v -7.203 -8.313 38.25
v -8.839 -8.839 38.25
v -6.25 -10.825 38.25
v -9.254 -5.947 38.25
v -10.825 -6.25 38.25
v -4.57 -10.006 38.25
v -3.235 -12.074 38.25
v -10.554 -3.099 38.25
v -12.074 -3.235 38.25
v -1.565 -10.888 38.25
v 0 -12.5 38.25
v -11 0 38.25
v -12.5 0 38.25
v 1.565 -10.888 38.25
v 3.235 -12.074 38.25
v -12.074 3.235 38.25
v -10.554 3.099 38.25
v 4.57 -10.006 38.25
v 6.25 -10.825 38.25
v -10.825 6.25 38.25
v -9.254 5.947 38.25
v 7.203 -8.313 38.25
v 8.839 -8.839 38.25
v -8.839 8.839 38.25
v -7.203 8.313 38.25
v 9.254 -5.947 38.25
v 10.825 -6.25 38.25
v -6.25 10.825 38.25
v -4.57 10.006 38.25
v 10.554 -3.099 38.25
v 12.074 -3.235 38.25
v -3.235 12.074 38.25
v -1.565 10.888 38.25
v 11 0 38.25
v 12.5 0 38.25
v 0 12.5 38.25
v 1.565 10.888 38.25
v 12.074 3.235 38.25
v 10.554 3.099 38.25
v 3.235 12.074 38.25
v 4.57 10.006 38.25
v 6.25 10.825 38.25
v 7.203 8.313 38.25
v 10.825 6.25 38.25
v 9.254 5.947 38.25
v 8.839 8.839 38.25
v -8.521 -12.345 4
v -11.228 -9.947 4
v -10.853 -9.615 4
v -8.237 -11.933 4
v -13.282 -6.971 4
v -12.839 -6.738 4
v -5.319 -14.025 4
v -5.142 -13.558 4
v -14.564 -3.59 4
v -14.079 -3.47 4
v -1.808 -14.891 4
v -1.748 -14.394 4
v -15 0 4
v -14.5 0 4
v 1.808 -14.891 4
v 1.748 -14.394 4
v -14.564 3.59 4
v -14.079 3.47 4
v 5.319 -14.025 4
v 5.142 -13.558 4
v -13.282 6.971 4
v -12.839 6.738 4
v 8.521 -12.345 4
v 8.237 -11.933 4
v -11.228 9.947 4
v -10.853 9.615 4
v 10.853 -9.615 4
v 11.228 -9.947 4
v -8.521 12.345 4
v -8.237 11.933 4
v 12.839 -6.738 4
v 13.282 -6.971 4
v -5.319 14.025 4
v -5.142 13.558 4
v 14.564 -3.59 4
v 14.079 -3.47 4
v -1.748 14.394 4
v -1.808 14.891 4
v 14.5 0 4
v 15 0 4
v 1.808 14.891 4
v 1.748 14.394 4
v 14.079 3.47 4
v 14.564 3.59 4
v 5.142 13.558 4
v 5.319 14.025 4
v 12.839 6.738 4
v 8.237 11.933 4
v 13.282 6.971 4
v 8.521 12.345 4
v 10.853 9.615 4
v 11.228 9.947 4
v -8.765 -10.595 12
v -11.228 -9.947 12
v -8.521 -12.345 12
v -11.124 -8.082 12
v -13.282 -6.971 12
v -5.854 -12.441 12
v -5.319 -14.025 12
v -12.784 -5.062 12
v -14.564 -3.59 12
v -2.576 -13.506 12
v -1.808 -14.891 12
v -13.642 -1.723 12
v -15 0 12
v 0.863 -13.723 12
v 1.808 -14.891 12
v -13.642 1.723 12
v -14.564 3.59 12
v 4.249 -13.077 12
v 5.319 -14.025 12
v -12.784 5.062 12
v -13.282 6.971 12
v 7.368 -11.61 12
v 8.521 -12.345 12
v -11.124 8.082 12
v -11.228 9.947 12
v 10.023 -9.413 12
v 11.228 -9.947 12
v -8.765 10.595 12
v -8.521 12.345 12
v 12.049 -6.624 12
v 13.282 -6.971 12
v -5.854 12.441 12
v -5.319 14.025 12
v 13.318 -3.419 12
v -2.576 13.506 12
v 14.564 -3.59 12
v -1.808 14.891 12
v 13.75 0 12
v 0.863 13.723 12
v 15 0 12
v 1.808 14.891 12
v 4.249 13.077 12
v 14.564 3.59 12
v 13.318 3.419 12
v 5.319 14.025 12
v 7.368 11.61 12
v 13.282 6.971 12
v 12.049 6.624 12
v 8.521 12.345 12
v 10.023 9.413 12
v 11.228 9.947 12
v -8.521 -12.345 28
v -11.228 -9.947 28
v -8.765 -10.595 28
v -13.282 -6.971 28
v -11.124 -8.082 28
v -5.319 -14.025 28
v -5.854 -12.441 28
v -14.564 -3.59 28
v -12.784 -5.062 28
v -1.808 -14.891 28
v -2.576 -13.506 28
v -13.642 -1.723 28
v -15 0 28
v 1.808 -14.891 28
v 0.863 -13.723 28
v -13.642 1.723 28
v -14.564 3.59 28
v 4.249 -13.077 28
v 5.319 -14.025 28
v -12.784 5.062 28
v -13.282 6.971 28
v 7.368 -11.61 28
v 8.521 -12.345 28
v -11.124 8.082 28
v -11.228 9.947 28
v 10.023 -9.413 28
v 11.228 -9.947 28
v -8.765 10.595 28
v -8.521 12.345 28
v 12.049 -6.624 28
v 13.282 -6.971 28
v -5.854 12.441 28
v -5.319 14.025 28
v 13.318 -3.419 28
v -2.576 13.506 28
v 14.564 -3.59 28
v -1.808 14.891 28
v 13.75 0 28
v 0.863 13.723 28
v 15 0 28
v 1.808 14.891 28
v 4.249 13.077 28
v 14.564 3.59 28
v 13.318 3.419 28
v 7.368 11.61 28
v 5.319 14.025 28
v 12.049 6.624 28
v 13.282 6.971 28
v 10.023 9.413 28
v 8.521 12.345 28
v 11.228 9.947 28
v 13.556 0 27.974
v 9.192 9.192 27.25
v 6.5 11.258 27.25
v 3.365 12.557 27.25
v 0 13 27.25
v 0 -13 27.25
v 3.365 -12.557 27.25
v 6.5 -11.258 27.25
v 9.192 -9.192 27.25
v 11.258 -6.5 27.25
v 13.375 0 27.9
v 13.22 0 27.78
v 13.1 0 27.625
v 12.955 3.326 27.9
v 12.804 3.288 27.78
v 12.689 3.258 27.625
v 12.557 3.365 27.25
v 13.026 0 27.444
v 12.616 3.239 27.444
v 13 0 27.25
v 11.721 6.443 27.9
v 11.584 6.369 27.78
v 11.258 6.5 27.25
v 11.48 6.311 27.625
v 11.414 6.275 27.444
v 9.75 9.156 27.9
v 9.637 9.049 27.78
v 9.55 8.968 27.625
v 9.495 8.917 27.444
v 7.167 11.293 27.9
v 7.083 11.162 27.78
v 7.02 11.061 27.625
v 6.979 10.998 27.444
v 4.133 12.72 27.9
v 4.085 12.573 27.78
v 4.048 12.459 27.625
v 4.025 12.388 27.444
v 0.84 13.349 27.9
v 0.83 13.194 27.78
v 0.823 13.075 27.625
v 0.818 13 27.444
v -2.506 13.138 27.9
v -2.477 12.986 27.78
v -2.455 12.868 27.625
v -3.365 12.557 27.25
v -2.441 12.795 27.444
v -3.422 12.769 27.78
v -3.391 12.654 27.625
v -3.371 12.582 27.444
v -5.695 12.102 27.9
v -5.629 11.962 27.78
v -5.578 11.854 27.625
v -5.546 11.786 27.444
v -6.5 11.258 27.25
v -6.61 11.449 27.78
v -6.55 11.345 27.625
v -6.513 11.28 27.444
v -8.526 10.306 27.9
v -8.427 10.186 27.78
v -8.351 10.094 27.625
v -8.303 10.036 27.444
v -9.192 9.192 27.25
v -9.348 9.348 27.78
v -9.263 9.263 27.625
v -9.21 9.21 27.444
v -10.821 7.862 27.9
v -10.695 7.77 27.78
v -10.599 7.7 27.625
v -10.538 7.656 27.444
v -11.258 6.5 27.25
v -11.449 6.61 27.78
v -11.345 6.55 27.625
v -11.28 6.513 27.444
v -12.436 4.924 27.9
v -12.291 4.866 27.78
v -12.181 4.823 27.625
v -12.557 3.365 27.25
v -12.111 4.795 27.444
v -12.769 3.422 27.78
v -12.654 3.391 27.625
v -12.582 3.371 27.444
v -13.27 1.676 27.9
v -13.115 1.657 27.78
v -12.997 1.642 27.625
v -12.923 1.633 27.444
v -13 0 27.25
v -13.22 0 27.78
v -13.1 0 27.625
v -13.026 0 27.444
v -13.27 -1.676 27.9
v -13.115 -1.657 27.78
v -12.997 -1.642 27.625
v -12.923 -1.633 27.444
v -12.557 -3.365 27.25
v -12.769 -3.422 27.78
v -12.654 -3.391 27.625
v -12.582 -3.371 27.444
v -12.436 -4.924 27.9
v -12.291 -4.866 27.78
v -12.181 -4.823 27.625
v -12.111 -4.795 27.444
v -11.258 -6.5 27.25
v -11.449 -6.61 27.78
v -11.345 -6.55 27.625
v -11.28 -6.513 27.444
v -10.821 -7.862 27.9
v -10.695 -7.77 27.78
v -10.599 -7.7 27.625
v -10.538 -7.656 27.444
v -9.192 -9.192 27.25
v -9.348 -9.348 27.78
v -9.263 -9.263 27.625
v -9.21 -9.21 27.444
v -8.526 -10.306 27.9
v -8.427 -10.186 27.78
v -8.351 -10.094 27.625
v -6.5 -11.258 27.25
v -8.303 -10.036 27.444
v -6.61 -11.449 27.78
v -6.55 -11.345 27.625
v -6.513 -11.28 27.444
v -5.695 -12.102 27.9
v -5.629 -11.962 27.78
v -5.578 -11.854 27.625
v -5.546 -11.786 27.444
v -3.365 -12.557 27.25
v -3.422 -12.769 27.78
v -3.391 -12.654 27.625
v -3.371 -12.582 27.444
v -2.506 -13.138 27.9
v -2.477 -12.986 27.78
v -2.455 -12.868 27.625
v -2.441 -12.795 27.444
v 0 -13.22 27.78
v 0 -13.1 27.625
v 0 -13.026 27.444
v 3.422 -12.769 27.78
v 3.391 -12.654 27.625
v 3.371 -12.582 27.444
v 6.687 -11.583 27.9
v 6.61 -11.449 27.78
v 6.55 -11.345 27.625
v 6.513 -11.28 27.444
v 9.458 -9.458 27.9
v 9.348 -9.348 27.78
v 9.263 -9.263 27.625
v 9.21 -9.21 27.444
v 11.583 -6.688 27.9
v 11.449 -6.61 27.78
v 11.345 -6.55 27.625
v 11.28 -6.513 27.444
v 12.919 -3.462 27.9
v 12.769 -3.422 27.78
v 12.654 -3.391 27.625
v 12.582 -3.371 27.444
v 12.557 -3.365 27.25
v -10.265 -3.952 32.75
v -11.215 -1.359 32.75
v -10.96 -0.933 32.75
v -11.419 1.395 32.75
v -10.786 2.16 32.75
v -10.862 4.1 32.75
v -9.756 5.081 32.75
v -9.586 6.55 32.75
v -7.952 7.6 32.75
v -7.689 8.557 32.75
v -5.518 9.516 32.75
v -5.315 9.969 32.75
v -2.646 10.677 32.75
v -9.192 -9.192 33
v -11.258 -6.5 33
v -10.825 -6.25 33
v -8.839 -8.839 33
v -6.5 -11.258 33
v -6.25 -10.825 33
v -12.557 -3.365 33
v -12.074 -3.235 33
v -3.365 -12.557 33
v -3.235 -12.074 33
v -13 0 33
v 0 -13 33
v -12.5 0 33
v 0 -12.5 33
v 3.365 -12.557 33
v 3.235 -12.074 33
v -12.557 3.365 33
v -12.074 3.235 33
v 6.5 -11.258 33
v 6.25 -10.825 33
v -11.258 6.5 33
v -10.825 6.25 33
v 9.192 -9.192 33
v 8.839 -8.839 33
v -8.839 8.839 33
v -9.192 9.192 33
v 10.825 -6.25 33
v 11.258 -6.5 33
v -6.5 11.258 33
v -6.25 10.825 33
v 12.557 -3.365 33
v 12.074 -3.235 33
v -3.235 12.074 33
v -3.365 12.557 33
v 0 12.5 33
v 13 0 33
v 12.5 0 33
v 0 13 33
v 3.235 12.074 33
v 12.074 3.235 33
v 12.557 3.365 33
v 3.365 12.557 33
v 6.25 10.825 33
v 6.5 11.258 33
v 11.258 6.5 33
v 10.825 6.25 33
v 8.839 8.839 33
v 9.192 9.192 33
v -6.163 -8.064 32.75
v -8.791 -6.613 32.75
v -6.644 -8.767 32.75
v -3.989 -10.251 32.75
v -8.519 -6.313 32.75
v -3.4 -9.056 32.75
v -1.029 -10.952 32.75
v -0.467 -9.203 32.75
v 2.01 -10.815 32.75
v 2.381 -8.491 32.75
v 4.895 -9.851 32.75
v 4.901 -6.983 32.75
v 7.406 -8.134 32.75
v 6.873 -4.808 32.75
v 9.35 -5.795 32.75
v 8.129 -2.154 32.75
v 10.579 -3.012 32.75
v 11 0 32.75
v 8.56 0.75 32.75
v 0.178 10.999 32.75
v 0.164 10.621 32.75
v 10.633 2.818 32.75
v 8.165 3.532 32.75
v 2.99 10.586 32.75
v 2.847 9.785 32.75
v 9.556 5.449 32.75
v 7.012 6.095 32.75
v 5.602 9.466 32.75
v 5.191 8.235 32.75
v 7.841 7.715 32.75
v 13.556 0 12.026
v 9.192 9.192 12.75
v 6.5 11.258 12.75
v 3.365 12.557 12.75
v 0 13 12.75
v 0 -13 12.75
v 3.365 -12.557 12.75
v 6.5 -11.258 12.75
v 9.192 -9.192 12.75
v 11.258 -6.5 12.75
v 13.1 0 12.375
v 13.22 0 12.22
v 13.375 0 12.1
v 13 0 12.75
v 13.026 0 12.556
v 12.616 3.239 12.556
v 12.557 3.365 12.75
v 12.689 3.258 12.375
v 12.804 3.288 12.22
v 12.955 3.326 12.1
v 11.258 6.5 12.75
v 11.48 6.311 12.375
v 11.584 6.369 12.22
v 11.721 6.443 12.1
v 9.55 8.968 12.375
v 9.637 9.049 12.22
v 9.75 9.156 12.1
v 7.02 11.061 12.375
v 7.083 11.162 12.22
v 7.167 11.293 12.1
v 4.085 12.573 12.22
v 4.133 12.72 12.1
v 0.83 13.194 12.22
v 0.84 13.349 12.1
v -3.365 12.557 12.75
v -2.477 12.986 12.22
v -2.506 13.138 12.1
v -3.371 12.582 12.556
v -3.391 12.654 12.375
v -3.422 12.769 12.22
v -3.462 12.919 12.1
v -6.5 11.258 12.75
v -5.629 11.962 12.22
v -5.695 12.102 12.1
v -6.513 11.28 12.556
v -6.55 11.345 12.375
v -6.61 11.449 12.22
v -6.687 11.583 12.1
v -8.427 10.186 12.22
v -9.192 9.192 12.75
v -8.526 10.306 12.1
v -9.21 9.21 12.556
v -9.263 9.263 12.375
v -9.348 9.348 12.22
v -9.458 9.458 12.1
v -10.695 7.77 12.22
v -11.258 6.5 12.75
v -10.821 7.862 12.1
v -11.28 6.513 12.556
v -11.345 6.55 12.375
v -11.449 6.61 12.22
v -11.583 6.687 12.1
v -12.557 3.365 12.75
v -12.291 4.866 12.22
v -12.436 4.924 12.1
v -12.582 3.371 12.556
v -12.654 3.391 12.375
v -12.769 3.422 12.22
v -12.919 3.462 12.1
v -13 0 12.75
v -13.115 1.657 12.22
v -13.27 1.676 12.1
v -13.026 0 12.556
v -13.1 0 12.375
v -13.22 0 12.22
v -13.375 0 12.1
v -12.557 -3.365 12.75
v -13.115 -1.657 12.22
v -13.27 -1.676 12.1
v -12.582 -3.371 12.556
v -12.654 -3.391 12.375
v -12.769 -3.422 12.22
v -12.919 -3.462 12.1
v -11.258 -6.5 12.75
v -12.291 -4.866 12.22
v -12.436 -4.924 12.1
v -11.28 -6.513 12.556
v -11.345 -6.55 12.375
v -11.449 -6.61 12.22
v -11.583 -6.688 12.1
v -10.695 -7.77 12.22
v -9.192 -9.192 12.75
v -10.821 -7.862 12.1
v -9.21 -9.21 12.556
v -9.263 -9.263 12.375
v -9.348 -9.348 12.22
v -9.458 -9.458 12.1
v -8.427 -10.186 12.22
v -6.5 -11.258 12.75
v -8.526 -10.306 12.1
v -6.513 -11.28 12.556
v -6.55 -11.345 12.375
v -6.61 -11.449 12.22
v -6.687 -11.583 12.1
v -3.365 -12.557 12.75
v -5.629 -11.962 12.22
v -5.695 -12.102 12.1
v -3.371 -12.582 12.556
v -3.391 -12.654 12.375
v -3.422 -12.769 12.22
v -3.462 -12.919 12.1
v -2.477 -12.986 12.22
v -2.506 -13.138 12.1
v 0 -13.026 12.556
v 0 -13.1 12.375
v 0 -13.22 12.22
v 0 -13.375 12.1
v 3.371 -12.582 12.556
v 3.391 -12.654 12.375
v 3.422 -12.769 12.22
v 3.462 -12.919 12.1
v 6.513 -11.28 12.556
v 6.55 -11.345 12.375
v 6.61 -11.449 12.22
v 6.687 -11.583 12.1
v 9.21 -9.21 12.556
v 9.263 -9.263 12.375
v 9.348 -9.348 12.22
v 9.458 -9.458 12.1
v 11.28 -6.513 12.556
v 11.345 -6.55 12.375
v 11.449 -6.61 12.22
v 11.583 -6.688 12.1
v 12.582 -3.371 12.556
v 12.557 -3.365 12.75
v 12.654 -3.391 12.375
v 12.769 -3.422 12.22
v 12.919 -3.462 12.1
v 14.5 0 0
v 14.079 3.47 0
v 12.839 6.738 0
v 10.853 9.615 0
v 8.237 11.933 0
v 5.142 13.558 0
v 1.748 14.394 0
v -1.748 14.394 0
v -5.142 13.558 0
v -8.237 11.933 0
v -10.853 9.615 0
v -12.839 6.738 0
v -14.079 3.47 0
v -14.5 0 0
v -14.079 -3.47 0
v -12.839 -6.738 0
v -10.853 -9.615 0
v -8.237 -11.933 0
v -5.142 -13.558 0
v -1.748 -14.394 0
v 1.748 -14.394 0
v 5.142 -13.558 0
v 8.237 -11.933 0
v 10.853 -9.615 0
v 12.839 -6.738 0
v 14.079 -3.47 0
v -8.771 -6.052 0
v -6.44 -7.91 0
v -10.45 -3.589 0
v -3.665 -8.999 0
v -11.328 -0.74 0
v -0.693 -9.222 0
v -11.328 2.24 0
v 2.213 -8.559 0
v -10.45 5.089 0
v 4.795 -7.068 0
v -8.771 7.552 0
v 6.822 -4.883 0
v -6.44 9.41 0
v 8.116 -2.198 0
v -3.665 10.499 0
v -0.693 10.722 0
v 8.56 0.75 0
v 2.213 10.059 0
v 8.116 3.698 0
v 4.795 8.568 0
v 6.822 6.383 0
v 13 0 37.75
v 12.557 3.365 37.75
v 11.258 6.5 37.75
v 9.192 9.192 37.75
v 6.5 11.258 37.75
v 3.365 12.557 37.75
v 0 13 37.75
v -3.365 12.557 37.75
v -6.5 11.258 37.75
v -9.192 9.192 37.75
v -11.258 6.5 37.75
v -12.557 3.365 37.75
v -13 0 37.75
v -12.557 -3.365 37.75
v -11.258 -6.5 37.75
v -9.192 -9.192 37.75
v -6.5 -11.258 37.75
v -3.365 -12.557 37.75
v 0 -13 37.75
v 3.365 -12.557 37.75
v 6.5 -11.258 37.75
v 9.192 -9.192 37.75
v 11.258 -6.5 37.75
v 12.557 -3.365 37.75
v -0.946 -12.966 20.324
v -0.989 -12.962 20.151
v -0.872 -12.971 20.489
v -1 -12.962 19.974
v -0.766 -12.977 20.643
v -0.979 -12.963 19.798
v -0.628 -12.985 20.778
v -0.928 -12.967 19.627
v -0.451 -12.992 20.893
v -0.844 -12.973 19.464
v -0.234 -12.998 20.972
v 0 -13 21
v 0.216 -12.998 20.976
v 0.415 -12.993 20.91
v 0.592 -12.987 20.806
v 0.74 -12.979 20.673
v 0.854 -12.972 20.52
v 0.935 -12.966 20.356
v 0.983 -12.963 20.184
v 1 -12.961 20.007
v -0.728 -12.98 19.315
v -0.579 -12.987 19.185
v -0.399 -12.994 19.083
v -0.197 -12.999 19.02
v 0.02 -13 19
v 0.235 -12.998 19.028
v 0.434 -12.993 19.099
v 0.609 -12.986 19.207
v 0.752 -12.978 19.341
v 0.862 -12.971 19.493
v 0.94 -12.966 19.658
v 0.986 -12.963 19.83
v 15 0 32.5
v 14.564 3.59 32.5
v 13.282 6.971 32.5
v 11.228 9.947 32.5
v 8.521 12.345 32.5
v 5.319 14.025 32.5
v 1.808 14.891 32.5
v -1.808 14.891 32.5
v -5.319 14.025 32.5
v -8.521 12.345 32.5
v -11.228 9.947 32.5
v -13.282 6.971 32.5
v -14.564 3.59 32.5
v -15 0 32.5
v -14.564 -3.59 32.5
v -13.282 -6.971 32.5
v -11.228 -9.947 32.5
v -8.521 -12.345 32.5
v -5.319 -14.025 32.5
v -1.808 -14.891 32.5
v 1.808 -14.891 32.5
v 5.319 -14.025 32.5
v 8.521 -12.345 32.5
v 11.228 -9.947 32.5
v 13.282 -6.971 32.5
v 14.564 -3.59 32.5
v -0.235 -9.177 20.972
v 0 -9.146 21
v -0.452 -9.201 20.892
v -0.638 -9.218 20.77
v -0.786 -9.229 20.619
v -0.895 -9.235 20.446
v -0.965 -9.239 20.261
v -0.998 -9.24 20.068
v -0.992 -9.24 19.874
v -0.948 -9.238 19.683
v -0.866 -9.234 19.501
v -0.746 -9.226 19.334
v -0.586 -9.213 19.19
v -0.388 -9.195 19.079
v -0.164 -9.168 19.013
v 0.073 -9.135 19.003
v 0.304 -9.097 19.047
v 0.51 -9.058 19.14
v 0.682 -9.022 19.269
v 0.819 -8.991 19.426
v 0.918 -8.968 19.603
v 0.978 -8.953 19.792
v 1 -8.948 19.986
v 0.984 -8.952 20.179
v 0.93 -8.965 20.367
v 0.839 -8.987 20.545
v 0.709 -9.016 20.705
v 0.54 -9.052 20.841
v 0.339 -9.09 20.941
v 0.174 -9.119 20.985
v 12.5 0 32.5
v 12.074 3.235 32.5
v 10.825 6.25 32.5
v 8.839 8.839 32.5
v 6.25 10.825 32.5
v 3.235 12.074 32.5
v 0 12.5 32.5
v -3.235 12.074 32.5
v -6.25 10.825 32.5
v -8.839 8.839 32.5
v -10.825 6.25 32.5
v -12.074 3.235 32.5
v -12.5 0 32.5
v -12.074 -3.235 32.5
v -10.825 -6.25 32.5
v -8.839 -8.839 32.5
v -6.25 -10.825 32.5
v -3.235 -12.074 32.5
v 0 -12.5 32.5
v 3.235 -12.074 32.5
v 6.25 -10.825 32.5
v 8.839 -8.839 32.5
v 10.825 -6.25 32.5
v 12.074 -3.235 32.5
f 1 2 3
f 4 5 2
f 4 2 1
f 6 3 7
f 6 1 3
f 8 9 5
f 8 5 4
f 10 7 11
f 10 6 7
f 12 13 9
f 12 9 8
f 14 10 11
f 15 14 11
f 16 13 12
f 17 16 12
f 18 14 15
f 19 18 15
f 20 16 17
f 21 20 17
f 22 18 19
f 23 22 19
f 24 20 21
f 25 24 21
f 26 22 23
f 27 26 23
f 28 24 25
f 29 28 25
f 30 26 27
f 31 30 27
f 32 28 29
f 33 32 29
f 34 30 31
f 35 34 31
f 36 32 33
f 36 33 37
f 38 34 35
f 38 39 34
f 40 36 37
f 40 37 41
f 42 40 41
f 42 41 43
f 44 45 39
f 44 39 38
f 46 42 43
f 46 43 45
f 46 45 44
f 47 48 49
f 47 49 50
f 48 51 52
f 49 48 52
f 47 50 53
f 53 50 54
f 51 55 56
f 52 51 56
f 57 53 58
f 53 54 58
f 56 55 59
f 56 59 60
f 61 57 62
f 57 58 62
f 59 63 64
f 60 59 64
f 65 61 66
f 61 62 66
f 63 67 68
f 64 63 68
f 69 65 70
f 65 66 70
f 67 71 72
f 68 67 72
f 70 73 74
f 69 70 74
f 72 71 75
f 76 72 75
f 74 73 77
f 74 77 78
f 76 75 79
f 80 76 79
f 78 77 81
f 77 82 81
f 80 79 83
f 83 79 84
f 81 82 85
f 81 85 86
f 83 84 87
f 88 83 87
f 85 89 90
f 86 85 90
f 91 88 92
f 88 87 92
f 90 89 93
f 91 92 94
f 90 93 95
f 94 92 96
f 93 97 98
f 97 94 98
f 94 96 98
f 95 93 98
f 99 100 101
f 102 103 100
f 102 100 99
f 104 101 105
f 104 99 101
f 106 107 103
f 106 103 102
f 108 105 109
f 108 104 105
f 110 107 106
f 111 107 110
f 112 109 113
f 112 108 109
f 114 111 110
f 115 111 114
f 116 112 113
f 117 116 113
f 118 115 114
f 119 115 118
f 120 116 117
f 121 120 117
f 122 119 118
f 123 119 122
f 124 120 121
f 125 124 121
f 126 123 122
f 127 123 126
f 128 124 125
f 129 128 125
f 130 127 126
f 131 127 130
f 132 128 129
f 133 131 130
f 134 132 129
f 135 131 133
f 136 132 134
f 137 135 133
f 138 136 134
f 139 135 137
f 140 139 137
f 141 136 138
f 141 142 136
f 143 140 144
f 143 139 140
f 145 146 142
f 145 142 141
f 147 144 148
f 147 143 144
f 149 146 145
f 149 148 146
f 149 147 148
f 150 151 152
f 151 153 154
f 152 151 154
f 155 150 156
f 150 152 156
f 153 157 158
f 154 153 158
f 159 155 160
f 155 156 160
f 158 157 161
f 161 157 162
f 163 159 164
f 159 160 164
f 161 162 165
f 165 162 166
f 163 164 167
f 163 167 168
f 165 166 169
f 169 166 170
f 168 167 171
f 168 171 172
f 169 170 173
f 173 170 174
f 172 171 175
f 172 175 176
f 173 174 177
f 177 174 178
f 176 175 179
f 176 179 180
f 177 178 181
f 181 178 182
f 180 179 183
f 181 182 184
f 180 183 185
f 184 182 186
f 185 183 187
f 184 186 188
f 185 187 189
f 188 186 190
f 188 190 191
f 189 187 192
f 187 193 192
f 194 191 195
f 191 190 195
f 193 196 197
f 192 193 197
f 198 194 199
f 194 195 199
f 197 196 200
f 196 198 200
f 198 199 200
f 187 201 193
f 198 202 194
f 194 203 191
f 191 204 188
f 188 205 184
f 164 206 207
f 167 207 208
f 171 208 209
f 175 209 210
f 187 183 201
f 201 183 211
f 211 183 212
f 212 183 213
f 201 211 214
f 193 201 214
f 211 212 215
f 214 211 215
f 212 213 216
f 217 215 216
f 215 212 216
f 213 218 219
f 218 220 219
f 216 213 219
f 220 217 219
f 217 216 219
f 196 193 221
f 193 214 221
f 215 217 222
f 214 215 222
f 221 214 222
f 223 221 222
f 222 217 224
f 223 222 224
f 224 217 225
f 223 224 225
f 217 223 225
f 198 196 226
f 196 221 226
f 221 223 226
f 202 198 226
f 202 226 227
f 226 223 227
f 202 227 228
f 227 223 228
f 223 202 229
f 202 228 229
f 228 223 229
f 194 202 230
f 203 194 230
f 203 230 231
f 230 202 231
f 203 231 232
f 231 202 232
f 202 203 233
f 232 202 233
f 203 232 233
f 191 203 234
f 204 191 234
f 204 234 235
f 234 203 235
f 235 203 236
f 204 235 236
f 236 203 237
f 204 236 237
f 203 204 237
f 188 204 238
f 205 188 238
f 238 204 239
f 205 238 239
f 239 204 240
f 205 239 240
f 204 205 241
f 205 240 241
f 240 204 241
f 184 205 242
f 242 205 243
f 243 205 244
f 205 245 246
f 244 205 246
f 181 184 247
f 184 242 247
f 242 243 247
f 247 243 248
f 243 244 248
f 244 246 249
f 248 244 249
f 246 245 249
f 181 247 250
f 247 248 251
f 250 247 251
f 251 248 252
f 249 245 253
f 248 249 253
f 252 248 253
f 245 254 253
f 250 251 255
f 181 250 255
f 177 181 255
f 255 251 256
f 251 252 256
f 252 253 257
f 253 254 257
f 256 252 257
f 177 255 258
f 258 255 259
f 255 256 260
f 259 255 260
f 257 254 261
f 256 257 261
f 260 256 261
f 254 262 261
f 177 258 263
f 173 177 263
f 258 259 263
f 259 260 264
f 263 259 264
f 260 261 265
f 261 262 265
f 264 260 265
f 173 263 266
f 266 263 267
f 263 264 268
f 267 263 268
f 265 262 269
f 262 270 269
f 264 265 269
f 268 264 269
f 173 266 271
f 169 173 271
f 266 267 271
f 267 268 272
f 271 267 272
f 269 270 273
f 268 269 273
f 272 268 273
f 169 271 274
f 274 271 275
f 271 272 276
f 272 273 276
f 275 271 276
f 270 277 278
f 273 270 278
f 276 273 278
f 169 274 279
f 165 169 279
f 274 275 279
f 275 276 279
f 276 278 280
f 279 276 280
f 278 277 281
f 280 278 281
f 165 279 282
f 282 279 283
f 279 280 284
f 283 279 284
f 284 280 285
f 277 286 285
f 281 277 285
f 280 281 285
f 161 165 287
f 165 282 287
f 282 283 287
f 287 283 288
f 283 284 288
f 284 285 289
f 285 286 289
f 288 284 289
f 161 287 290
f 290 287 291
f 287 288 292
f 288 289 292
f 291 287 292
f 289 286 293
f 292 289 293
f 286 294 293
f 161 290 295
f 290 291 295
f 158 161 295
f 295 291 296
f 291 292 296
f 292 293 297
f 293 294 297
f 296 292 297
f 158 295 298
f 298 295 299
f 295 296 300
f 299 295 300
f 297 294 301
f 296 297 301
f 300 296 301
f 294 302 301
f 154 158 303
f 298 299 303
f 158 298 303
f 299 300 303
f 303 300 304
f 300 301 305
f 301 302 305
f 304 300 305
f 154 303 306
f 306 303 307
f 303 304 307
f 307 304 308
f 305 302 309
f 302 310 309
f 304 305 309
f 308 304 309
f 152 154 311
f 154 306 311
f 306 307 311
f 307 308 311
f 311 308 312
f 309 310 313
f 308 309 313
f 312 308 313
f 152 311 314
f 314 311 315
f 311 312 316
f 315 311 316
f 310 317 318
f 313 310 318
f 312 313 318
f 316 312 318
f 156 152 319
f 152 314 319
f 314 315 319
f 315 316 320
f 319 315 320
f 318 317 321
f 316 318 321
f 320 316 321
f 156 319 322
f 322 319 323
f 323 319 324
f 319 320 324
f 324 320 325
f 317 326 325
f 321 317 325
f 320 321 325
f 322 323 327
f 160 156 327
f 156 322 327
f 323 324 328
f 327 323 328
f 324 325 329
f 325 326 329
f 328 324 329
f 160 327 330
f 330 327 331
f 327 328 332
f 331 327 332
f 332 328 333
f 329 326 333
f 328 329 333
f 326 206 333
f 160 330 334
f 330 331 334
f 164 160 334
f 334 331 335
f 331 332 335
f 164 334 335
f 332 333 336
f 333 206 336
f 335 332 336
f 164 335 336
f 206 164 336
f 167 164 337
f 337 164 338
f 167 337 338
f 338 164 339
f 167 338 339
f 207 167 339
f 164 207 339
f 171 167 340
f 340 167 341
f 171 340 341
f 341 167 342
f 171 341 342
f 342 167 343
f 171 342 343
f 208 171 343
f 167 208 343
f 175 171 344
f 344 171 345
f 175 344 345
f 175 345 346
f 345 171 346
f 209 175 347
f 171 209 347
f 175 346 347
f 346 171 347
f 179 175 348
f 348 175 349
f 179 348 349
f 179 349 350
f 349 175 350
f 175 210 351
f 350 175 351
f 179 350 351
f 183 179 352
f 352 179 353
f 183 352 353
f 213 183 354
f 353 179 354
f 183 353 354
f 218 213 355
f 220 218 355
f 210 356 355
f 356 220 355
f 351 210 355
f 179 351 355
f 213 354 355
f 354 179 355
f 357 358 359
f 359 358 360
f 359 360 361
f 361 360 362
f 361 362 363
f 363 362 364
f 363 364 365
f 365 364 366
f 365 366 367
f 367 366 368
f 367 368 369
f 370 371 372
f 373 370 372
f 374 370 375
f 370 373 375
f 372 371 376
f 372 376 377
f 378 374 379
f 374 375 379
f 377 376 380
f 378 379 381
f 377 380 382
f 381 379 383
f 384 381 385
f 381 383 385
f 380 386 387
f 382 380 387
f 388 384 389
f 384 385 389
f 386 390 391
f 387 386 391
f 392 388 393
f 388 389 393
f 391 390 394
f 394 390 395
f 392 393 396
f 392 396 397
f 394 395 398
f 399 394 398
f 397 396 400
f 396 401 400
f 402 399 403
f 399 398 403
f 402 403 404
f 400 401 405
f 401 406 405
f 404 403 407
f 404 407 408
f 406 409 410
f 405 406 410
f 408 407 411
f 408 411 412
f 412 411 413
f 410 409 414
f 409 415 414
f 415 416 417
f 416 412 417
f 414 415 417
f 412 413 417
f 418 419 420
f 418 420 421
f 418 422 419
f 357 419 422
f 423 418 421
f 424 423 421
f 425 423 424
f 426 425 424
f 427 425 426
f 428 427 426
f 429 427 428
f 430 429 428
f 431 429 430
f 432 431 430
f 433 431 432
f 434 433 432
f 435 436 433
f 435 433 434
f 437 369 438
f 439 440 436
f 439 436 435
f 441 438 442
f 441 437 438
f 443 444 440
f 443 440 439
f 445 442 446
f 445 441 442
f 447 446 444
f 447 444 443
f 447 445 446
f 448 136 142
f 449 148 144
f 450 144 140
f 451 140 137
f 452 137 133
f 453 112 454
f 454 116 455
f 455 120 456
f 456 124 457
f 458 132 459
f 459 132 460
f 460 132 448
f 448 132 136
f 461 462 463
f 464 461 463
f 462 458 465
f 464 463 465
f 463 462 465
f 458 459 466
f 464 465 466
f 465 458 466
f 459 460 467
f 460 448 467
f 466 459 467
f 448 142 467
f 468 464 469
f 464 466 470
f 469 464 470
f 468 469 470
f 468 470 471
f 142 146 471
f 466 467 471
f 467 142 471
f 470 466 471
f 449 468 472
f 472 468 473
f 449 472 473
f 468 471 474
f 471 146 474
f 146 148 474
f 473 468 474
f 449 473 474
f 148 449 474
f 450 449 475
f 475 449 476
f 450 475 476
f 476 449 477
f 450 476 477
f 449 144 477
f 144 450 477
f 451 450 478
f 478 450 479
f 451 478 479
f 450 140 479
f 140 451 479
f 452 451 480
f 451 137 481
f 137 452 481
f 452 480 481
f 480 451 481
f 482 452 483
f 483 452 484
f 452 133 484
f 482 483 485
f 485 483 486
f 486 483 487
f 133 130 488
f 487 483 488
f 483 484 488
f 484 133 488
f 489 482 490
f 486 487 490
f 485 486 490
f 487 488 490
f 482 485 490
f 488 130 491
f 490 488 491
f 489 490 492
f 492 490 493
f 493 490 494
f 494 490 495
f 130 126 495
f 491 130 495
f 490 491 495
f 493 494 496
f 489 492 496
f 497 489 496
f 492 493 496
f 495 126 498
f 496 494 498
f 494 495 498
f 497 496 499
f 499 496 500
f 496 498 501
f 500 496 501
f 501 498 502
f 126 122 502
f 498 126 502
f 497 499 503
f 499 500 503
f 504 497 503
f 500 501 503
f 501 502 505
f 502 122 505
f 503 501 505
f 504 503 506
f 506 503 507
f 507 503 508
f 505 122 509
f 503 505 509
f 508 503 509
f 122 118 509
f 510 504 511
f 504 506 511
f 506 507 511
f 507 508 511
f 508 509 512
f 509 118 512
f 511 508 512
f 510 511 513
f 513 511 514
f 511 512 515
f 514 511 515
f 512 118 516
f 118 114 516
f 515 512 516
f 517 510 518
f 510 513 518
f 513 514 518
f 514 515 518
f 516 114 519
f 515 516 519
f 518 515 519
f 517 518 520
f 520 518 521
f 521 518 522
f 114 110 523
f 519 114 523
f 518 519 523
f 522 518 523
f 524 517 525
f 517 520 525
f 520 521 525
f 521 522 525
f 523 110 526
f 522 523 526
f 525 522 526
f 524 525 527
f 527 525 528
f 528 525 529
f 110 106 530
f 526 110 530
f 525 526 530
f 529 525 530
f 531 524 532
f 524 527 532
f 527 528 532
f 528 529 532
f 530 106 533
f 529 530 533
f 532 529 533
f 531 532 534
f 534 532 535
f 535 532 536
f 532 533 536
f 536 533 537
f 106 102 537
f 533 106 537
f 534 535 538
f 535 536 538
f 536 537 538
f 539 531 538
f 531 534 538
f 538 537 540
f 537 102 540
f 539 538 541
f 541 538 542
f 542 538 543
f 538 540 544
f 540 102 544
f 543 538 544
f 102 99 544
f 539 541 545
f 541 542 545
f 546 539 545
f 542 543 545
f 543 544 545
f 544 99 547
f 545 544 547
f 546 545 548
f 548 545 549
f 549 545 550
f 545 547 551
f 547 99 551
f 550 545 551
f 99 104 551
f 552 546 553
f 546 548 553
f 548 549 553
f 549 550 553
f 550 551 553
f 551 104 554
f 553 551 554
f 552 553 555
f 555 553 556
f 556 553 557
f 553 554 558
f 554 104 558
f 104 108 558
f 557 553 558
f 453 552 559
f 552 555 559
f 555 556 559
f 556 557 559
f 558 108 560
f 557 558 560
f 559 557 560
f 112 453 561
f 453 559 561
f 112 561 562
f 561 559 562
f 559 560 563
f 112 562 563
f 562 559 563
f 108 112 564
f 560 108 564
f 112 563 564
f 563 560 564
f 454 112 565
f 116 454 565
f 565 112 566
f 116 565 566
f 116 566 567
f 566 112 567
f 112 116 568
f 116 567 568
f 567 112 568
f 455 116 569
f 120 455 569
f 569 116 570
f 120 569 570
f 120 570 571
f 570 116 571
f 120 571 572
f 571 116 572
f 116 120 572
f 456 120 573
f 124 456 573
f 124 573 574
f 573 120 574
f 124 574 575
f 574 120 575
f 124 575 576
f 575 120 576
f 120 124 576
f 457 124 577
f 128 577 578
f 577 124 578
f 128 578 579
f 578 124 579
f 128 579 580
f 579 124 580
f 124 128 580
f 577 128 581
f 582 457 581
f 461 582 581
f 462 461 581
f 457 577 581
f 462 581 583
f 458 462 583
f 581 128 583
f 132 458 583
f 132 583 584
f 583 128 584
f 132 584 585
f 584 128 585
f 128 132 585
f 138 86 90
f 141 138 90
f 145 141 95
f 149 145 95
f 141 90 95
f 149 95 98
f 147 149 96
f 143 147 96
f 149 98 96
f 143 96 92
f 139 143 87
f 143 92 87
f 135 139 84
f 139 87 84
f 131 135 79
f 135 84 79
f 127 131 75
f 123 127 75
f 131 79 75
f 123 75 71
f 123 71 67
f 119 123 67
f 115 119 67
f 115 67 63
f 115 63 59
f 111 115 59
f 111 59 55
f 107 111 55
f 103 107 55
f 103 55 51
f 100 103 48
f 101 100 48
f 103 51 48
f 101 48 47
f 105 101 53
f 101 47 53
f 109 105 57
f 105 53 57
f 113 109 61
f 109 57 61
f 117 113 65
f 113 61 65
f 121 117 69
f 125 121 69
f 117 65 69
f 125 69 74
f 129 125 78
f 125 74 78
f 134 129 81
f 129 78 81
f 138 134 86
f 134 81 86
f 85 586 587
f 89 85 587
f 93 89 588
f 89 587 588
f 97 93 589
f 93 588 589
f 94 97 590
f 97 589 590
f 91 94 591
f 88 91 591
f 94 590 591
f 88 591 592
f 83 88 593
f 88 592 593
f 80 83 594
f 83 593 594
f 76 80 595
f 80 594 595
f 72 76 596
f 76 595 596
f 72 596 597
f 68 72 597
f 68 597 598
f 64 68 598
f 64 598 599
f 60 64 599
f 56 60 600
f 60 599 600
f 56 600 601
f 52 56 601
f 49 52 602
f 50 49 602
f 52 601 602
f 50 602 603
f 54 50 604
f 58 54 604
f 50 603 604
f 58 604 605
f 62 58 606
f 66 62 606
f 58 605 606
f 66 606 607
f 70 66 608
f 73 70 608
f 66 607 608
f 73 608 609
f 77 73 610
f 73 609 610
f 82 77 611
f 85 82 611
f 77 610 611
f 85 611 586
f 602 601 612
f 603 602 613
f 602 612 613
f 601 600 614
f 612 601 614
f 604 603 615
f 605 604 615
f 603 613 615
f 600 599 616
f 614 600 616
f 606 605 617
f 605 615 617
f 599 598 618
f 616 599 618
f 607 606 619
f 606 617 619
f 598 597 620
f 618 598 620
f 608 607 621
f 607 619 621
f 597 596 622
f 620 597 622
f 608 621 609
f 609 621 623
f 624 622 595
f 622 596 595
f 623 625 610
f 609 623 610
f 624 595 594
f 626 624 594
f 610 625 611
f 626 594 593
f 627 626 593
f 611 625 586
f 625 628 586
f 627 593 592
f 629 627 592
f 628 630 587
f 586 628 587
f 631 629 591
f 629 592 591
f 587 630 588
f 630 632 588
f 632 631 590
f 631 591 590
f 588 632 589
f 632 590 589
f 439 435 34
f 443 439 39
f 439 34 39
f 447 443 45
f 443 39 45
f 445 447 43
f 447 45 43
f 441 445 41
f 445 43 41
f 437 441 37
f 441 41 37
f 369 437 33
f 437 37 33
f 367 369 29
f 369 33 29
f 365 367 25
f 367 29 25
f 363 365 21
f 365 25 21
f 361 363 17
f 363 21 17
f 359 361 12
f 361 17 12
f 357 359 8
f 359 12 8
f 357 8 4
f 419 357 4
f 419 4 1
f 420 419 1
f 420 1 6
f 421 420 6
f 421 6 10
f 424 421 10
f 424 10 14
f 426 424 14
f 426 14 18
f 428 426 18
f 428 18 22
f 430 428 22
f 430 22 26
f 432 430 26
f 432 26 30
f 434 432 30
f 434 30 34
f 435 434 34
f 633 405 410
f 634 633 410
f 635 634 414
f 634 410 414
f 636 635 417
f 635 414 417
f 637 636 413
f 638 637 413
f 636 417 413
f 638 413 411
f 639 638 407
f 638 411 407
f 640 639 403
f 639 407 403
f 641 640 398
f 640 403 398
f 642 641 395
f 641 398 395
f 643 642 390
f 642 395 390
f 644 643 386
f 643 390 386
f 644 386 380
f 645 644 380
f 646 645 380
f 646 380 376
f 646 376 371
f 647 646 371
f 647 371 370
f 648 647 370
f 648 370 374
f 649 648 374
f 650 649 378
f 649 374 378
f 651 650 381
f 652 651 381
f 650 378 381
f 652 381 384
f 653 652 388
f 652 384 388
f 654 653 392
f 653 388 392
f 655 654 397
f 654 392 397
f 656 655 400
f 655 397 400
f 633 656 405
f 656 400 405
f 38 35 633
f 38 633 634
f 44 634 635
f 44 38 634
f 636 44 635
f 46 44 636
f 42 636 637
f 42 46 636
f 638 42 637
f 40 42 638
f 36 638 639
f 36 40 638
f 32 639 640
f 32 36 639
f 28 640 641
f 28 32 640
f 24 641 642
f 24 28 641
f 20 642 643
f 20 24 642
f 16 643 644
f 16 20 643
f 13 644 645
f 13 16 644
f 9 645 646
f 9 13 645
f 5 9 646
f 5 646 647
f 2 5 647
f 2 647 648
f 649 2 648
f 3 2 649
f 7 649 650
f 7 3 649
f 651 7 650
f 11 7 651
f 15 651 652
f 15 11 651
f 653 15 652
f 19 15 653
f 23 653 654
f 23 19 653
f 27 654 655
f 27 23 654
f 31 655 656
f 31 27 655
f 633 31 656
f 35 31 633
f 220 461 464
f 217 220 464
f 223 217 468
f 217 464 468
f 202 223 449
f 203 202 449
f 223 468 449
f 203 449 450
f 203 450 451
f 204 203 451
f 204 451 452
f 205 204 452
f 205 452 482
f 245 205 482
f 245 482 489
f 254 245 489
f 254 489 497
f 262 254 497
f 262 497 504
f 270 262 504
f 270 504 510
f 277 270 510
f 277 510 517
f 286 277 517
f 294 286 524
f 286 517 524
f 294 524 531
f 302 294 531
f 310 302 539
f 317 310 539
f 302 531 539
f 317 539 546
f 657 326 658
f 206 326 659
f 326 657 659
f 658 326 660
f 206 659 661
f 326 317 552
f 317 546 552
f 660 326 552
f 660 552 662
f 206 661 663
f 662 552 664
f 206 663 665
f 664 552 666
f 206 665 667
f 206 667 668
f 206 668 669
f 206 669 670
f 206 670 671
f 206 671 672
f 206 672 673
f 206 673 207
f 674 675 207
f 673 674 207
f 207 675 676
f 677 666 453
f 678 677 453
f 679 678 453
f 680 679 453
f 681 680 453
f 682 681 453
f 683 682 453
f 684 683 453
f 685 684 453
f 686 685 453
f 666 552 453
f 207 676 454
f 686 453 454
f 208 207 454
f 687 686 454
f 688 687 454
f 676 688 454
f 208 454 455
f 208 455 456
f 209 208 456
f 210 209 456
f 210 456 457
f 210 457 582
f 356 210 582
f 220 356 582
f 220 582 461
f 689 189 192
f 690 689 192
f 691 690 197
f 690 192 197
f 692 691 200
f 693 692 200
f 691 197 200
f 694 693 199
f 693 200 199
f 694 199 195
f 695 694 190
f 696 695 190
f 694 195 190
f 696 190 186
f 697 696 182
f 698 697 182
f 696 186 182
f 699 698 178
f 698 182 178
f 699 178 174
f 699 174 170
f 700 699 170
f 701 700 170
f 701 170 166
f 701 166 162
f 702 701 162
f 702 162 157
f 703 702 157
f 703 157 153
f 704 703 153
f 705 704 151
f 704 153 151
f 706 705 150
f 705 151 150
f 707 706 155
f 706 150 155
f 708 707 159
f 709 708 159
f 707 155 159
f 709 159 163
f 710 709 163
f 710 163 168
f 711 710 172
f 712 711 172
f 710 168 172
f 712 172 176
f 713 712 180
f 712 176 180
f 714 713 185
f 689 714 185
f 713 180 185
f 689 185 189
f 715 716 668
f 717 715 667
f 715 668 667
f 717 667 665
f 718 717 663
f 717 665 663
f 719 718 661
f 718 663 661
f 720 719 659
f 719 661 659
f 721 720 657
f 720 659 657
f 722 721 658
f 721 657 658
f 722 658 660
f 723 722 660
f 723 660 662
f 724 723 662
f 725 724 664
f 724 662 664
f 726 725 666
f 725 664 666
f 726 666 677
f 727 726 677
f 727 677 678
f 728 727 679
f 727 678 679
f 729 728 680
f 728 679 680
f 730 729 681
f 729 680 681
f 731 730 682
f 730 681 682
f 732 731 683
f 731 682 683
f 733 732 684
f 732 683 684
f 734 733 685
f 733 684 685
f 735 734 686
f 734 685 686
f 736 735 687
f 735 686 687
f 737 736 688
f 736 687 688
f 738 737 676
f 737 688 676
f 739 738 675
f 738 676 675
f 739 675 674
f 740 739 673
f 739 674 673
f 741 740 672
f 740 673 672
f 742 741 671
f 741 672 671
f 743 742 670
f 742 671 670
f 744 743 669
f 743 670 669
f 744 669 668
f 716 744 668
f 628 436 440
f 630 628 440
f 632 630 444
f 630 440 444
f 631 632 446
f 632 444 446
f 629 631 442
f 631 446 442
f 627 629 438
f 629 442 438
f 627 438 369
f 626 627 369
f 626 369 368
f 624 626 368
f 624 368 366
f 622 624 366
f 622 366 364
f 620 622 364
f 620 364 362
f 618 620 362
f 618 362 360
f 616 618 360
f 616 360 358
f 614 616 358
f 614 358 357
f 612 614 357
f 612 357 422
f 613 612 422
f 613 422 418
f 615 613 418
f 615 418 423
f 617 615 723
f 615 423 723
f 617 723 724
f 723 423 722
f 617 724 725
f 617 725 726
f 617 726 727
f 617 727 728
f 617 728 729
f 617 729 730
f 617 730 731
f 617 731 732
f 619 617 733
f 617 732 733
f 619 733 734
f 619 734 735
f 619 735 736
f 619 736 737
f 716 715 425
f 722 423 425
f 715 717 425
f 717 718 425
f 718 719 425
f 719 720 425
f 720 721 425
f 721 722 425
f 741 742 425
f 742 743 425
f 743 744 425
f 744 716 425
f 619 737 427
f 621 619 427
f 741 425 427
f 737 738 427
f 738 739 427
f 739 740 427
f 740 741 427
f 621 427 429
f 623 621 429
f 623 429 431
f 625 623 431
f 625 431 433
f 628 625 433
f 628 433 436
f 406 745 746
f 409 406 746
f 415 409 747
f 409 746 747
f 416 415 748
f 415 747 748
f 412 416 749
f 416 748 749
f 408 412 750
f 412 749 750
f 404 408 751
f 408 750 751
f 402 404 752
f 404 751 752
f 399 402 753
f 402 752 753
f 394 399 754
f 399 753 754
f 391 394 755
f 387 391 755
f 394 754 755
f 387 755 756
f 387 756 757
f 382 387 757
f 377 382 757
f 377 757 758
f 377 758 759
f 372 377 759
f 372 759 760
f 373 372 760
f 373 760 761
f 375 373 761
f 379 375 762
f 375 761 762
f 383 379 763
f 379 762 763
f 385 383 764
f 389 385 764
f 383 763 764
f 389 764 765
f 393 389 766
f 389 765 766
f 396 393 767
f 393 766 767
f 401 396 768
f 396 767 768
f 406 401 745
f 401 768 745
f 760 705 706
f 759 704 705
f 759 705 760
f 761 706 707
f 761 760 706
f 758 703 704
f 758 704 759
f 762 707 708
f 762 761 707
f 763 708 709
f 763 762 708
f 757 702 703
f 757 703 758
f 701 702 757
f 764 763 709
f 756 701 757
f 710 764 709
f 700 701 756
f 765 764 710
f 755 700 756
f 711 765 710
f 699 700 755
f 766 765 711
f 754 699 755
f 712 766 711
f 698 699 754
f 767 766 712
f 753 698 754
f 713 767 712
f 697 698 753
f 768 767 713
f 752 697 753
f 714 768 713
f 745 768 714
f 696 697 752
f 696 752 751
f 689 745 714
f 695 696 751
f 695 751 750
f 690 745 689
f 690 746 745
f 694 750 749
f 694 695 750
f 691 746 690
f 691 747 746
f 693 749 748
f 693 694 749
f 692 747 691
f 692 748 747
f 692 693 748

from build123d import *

# Parameters (mm, degrees)
SKETCH1_R           = 14.5
BOSS_EXTRUDE1_DEPTH = 4
SKETCH2_R           = 15
BOSS_EXTRUDE2_DEPTH = 8
SKETCH3_R           = 13
BOSS_EXTRUDE3_DEPTH = 16
SKETCH4_R           = 15
BOSS_EXTRUDE4_DEPTH = 4.5
SKETCH5_R           = 12.5
BOSS_EXTRUDE5_DEPTH = 0.5
SKETCH6_R           = 13
BOSS_EXTRUDE6_DEPTH = 5.25
SKETCH7_R           = 11
CUT_EXTRUDE1_DEPTH  = 5.5
SKETCH8_R           = 10
CUT_EXTRUDE2_DEPTH  = 32.75
FILLET1_R           = 0.75
CHAMFER1_SIZE       = 0.5
SKETCH11_W          = 1
SKETCH11_H          = 15


with BuildPart() as part:
    # Sketch1 → Boss-Extrude1 (new body)
    with BuildSketch(Plane.XY):
        Circle(SKETCH1_R)
    extrude(amount=BOSS_EXTRUDE1_DEPTH)

    # Sketch2 → Boss-Extrude2 (add)
    with BuildSketch(Plane.XY.offset(4)):
        Circle(SKETCH2_R)
    extrude(amount=BOSS_EXTRUDE2_DEPTH)

    # Sketch3 → Boss-Extrude3 (add)
    with BuildSketch(Plane.XY.offset(12)):
        Circle(SKETCH3_R)
    extrude(amount=BOSS_EXTRUDE3_DEPTH)

    # Sketch4 → Boss-Extrude4 (add)
    with BuildSketch(Plane.XY.offset(28)):
        Circle(SKETCH4_R)
    extrude(amount=BOSS_EXTRUDE4_DEPTH)

    # Sketch5 → Boss-Extrude5 (add)
    with BuildSketch(Plane.XY.offset(32.5)):
        Circle(SKETCH5_R)
    extrude(amount=BOSS_EXTRUDE5_DEPTH)

    # Sketch6 → Boss-Extrude6 (add)
    with BuildSketch(Plane.XY.offset(33)):
        Circle(SKETCH6_R)
    extrude(amount=BOSS_EXTRUDE6_DEPTH)

    # Sketch7 → Cut-Extrude1 (cut)
    with BuildSketch(Plane.XY.offset(38.25)):
        Circle(SKETCH7_R)
    extrude(amount=-CUT_EXTRUDE1_DEPTH, mode=Mode.SUBTRACT)

    # Sketch8 → Cut-Extrude2 (cut)
    with BuildSketch(Plane.XY.offset(32.75)):
        with Locations((-1.44, 0.75)):
            Circle(SKETCH8_R)
    extrude(amount=-CUT_EXTRUDE2_DEPTH, mode=Mode.SUBTRACT)

    # Fillet1
    fillet1_edges = [part.edges().sort_by_distance(p)[0] for p in [
        (-13, 0, 12),
        (-13, 0, 28),
    ]]
    fillet(fillet1_edges, radius=FILLET1_R)

    # Chamfer1
    chamfer1_edges = [part.edges().sort_by_distance(p)[0] for p in [
        (-13, 0, 38.25),
    ]]
    chamfer(chamfer1_edges, length=CHAMFER1_SIZE)

    # Sketch11 → Ø2.0 (2) Diameter Hole2 (revolve, cut)
    with BuildSketch(Plane(origin=(0, 0, 20), x_dir=(0, 0, 1), z_dir=(1, 0, 0))):
        with Locations((0.5, 7.5)):
            Rectangle(SKETCH11_W, SKETCH11_H)
    revolve(axis=Axis((0, 6.35, 20), (0, -1, 0)), mode=Mode.SUBTRACT)


solid = part.part
